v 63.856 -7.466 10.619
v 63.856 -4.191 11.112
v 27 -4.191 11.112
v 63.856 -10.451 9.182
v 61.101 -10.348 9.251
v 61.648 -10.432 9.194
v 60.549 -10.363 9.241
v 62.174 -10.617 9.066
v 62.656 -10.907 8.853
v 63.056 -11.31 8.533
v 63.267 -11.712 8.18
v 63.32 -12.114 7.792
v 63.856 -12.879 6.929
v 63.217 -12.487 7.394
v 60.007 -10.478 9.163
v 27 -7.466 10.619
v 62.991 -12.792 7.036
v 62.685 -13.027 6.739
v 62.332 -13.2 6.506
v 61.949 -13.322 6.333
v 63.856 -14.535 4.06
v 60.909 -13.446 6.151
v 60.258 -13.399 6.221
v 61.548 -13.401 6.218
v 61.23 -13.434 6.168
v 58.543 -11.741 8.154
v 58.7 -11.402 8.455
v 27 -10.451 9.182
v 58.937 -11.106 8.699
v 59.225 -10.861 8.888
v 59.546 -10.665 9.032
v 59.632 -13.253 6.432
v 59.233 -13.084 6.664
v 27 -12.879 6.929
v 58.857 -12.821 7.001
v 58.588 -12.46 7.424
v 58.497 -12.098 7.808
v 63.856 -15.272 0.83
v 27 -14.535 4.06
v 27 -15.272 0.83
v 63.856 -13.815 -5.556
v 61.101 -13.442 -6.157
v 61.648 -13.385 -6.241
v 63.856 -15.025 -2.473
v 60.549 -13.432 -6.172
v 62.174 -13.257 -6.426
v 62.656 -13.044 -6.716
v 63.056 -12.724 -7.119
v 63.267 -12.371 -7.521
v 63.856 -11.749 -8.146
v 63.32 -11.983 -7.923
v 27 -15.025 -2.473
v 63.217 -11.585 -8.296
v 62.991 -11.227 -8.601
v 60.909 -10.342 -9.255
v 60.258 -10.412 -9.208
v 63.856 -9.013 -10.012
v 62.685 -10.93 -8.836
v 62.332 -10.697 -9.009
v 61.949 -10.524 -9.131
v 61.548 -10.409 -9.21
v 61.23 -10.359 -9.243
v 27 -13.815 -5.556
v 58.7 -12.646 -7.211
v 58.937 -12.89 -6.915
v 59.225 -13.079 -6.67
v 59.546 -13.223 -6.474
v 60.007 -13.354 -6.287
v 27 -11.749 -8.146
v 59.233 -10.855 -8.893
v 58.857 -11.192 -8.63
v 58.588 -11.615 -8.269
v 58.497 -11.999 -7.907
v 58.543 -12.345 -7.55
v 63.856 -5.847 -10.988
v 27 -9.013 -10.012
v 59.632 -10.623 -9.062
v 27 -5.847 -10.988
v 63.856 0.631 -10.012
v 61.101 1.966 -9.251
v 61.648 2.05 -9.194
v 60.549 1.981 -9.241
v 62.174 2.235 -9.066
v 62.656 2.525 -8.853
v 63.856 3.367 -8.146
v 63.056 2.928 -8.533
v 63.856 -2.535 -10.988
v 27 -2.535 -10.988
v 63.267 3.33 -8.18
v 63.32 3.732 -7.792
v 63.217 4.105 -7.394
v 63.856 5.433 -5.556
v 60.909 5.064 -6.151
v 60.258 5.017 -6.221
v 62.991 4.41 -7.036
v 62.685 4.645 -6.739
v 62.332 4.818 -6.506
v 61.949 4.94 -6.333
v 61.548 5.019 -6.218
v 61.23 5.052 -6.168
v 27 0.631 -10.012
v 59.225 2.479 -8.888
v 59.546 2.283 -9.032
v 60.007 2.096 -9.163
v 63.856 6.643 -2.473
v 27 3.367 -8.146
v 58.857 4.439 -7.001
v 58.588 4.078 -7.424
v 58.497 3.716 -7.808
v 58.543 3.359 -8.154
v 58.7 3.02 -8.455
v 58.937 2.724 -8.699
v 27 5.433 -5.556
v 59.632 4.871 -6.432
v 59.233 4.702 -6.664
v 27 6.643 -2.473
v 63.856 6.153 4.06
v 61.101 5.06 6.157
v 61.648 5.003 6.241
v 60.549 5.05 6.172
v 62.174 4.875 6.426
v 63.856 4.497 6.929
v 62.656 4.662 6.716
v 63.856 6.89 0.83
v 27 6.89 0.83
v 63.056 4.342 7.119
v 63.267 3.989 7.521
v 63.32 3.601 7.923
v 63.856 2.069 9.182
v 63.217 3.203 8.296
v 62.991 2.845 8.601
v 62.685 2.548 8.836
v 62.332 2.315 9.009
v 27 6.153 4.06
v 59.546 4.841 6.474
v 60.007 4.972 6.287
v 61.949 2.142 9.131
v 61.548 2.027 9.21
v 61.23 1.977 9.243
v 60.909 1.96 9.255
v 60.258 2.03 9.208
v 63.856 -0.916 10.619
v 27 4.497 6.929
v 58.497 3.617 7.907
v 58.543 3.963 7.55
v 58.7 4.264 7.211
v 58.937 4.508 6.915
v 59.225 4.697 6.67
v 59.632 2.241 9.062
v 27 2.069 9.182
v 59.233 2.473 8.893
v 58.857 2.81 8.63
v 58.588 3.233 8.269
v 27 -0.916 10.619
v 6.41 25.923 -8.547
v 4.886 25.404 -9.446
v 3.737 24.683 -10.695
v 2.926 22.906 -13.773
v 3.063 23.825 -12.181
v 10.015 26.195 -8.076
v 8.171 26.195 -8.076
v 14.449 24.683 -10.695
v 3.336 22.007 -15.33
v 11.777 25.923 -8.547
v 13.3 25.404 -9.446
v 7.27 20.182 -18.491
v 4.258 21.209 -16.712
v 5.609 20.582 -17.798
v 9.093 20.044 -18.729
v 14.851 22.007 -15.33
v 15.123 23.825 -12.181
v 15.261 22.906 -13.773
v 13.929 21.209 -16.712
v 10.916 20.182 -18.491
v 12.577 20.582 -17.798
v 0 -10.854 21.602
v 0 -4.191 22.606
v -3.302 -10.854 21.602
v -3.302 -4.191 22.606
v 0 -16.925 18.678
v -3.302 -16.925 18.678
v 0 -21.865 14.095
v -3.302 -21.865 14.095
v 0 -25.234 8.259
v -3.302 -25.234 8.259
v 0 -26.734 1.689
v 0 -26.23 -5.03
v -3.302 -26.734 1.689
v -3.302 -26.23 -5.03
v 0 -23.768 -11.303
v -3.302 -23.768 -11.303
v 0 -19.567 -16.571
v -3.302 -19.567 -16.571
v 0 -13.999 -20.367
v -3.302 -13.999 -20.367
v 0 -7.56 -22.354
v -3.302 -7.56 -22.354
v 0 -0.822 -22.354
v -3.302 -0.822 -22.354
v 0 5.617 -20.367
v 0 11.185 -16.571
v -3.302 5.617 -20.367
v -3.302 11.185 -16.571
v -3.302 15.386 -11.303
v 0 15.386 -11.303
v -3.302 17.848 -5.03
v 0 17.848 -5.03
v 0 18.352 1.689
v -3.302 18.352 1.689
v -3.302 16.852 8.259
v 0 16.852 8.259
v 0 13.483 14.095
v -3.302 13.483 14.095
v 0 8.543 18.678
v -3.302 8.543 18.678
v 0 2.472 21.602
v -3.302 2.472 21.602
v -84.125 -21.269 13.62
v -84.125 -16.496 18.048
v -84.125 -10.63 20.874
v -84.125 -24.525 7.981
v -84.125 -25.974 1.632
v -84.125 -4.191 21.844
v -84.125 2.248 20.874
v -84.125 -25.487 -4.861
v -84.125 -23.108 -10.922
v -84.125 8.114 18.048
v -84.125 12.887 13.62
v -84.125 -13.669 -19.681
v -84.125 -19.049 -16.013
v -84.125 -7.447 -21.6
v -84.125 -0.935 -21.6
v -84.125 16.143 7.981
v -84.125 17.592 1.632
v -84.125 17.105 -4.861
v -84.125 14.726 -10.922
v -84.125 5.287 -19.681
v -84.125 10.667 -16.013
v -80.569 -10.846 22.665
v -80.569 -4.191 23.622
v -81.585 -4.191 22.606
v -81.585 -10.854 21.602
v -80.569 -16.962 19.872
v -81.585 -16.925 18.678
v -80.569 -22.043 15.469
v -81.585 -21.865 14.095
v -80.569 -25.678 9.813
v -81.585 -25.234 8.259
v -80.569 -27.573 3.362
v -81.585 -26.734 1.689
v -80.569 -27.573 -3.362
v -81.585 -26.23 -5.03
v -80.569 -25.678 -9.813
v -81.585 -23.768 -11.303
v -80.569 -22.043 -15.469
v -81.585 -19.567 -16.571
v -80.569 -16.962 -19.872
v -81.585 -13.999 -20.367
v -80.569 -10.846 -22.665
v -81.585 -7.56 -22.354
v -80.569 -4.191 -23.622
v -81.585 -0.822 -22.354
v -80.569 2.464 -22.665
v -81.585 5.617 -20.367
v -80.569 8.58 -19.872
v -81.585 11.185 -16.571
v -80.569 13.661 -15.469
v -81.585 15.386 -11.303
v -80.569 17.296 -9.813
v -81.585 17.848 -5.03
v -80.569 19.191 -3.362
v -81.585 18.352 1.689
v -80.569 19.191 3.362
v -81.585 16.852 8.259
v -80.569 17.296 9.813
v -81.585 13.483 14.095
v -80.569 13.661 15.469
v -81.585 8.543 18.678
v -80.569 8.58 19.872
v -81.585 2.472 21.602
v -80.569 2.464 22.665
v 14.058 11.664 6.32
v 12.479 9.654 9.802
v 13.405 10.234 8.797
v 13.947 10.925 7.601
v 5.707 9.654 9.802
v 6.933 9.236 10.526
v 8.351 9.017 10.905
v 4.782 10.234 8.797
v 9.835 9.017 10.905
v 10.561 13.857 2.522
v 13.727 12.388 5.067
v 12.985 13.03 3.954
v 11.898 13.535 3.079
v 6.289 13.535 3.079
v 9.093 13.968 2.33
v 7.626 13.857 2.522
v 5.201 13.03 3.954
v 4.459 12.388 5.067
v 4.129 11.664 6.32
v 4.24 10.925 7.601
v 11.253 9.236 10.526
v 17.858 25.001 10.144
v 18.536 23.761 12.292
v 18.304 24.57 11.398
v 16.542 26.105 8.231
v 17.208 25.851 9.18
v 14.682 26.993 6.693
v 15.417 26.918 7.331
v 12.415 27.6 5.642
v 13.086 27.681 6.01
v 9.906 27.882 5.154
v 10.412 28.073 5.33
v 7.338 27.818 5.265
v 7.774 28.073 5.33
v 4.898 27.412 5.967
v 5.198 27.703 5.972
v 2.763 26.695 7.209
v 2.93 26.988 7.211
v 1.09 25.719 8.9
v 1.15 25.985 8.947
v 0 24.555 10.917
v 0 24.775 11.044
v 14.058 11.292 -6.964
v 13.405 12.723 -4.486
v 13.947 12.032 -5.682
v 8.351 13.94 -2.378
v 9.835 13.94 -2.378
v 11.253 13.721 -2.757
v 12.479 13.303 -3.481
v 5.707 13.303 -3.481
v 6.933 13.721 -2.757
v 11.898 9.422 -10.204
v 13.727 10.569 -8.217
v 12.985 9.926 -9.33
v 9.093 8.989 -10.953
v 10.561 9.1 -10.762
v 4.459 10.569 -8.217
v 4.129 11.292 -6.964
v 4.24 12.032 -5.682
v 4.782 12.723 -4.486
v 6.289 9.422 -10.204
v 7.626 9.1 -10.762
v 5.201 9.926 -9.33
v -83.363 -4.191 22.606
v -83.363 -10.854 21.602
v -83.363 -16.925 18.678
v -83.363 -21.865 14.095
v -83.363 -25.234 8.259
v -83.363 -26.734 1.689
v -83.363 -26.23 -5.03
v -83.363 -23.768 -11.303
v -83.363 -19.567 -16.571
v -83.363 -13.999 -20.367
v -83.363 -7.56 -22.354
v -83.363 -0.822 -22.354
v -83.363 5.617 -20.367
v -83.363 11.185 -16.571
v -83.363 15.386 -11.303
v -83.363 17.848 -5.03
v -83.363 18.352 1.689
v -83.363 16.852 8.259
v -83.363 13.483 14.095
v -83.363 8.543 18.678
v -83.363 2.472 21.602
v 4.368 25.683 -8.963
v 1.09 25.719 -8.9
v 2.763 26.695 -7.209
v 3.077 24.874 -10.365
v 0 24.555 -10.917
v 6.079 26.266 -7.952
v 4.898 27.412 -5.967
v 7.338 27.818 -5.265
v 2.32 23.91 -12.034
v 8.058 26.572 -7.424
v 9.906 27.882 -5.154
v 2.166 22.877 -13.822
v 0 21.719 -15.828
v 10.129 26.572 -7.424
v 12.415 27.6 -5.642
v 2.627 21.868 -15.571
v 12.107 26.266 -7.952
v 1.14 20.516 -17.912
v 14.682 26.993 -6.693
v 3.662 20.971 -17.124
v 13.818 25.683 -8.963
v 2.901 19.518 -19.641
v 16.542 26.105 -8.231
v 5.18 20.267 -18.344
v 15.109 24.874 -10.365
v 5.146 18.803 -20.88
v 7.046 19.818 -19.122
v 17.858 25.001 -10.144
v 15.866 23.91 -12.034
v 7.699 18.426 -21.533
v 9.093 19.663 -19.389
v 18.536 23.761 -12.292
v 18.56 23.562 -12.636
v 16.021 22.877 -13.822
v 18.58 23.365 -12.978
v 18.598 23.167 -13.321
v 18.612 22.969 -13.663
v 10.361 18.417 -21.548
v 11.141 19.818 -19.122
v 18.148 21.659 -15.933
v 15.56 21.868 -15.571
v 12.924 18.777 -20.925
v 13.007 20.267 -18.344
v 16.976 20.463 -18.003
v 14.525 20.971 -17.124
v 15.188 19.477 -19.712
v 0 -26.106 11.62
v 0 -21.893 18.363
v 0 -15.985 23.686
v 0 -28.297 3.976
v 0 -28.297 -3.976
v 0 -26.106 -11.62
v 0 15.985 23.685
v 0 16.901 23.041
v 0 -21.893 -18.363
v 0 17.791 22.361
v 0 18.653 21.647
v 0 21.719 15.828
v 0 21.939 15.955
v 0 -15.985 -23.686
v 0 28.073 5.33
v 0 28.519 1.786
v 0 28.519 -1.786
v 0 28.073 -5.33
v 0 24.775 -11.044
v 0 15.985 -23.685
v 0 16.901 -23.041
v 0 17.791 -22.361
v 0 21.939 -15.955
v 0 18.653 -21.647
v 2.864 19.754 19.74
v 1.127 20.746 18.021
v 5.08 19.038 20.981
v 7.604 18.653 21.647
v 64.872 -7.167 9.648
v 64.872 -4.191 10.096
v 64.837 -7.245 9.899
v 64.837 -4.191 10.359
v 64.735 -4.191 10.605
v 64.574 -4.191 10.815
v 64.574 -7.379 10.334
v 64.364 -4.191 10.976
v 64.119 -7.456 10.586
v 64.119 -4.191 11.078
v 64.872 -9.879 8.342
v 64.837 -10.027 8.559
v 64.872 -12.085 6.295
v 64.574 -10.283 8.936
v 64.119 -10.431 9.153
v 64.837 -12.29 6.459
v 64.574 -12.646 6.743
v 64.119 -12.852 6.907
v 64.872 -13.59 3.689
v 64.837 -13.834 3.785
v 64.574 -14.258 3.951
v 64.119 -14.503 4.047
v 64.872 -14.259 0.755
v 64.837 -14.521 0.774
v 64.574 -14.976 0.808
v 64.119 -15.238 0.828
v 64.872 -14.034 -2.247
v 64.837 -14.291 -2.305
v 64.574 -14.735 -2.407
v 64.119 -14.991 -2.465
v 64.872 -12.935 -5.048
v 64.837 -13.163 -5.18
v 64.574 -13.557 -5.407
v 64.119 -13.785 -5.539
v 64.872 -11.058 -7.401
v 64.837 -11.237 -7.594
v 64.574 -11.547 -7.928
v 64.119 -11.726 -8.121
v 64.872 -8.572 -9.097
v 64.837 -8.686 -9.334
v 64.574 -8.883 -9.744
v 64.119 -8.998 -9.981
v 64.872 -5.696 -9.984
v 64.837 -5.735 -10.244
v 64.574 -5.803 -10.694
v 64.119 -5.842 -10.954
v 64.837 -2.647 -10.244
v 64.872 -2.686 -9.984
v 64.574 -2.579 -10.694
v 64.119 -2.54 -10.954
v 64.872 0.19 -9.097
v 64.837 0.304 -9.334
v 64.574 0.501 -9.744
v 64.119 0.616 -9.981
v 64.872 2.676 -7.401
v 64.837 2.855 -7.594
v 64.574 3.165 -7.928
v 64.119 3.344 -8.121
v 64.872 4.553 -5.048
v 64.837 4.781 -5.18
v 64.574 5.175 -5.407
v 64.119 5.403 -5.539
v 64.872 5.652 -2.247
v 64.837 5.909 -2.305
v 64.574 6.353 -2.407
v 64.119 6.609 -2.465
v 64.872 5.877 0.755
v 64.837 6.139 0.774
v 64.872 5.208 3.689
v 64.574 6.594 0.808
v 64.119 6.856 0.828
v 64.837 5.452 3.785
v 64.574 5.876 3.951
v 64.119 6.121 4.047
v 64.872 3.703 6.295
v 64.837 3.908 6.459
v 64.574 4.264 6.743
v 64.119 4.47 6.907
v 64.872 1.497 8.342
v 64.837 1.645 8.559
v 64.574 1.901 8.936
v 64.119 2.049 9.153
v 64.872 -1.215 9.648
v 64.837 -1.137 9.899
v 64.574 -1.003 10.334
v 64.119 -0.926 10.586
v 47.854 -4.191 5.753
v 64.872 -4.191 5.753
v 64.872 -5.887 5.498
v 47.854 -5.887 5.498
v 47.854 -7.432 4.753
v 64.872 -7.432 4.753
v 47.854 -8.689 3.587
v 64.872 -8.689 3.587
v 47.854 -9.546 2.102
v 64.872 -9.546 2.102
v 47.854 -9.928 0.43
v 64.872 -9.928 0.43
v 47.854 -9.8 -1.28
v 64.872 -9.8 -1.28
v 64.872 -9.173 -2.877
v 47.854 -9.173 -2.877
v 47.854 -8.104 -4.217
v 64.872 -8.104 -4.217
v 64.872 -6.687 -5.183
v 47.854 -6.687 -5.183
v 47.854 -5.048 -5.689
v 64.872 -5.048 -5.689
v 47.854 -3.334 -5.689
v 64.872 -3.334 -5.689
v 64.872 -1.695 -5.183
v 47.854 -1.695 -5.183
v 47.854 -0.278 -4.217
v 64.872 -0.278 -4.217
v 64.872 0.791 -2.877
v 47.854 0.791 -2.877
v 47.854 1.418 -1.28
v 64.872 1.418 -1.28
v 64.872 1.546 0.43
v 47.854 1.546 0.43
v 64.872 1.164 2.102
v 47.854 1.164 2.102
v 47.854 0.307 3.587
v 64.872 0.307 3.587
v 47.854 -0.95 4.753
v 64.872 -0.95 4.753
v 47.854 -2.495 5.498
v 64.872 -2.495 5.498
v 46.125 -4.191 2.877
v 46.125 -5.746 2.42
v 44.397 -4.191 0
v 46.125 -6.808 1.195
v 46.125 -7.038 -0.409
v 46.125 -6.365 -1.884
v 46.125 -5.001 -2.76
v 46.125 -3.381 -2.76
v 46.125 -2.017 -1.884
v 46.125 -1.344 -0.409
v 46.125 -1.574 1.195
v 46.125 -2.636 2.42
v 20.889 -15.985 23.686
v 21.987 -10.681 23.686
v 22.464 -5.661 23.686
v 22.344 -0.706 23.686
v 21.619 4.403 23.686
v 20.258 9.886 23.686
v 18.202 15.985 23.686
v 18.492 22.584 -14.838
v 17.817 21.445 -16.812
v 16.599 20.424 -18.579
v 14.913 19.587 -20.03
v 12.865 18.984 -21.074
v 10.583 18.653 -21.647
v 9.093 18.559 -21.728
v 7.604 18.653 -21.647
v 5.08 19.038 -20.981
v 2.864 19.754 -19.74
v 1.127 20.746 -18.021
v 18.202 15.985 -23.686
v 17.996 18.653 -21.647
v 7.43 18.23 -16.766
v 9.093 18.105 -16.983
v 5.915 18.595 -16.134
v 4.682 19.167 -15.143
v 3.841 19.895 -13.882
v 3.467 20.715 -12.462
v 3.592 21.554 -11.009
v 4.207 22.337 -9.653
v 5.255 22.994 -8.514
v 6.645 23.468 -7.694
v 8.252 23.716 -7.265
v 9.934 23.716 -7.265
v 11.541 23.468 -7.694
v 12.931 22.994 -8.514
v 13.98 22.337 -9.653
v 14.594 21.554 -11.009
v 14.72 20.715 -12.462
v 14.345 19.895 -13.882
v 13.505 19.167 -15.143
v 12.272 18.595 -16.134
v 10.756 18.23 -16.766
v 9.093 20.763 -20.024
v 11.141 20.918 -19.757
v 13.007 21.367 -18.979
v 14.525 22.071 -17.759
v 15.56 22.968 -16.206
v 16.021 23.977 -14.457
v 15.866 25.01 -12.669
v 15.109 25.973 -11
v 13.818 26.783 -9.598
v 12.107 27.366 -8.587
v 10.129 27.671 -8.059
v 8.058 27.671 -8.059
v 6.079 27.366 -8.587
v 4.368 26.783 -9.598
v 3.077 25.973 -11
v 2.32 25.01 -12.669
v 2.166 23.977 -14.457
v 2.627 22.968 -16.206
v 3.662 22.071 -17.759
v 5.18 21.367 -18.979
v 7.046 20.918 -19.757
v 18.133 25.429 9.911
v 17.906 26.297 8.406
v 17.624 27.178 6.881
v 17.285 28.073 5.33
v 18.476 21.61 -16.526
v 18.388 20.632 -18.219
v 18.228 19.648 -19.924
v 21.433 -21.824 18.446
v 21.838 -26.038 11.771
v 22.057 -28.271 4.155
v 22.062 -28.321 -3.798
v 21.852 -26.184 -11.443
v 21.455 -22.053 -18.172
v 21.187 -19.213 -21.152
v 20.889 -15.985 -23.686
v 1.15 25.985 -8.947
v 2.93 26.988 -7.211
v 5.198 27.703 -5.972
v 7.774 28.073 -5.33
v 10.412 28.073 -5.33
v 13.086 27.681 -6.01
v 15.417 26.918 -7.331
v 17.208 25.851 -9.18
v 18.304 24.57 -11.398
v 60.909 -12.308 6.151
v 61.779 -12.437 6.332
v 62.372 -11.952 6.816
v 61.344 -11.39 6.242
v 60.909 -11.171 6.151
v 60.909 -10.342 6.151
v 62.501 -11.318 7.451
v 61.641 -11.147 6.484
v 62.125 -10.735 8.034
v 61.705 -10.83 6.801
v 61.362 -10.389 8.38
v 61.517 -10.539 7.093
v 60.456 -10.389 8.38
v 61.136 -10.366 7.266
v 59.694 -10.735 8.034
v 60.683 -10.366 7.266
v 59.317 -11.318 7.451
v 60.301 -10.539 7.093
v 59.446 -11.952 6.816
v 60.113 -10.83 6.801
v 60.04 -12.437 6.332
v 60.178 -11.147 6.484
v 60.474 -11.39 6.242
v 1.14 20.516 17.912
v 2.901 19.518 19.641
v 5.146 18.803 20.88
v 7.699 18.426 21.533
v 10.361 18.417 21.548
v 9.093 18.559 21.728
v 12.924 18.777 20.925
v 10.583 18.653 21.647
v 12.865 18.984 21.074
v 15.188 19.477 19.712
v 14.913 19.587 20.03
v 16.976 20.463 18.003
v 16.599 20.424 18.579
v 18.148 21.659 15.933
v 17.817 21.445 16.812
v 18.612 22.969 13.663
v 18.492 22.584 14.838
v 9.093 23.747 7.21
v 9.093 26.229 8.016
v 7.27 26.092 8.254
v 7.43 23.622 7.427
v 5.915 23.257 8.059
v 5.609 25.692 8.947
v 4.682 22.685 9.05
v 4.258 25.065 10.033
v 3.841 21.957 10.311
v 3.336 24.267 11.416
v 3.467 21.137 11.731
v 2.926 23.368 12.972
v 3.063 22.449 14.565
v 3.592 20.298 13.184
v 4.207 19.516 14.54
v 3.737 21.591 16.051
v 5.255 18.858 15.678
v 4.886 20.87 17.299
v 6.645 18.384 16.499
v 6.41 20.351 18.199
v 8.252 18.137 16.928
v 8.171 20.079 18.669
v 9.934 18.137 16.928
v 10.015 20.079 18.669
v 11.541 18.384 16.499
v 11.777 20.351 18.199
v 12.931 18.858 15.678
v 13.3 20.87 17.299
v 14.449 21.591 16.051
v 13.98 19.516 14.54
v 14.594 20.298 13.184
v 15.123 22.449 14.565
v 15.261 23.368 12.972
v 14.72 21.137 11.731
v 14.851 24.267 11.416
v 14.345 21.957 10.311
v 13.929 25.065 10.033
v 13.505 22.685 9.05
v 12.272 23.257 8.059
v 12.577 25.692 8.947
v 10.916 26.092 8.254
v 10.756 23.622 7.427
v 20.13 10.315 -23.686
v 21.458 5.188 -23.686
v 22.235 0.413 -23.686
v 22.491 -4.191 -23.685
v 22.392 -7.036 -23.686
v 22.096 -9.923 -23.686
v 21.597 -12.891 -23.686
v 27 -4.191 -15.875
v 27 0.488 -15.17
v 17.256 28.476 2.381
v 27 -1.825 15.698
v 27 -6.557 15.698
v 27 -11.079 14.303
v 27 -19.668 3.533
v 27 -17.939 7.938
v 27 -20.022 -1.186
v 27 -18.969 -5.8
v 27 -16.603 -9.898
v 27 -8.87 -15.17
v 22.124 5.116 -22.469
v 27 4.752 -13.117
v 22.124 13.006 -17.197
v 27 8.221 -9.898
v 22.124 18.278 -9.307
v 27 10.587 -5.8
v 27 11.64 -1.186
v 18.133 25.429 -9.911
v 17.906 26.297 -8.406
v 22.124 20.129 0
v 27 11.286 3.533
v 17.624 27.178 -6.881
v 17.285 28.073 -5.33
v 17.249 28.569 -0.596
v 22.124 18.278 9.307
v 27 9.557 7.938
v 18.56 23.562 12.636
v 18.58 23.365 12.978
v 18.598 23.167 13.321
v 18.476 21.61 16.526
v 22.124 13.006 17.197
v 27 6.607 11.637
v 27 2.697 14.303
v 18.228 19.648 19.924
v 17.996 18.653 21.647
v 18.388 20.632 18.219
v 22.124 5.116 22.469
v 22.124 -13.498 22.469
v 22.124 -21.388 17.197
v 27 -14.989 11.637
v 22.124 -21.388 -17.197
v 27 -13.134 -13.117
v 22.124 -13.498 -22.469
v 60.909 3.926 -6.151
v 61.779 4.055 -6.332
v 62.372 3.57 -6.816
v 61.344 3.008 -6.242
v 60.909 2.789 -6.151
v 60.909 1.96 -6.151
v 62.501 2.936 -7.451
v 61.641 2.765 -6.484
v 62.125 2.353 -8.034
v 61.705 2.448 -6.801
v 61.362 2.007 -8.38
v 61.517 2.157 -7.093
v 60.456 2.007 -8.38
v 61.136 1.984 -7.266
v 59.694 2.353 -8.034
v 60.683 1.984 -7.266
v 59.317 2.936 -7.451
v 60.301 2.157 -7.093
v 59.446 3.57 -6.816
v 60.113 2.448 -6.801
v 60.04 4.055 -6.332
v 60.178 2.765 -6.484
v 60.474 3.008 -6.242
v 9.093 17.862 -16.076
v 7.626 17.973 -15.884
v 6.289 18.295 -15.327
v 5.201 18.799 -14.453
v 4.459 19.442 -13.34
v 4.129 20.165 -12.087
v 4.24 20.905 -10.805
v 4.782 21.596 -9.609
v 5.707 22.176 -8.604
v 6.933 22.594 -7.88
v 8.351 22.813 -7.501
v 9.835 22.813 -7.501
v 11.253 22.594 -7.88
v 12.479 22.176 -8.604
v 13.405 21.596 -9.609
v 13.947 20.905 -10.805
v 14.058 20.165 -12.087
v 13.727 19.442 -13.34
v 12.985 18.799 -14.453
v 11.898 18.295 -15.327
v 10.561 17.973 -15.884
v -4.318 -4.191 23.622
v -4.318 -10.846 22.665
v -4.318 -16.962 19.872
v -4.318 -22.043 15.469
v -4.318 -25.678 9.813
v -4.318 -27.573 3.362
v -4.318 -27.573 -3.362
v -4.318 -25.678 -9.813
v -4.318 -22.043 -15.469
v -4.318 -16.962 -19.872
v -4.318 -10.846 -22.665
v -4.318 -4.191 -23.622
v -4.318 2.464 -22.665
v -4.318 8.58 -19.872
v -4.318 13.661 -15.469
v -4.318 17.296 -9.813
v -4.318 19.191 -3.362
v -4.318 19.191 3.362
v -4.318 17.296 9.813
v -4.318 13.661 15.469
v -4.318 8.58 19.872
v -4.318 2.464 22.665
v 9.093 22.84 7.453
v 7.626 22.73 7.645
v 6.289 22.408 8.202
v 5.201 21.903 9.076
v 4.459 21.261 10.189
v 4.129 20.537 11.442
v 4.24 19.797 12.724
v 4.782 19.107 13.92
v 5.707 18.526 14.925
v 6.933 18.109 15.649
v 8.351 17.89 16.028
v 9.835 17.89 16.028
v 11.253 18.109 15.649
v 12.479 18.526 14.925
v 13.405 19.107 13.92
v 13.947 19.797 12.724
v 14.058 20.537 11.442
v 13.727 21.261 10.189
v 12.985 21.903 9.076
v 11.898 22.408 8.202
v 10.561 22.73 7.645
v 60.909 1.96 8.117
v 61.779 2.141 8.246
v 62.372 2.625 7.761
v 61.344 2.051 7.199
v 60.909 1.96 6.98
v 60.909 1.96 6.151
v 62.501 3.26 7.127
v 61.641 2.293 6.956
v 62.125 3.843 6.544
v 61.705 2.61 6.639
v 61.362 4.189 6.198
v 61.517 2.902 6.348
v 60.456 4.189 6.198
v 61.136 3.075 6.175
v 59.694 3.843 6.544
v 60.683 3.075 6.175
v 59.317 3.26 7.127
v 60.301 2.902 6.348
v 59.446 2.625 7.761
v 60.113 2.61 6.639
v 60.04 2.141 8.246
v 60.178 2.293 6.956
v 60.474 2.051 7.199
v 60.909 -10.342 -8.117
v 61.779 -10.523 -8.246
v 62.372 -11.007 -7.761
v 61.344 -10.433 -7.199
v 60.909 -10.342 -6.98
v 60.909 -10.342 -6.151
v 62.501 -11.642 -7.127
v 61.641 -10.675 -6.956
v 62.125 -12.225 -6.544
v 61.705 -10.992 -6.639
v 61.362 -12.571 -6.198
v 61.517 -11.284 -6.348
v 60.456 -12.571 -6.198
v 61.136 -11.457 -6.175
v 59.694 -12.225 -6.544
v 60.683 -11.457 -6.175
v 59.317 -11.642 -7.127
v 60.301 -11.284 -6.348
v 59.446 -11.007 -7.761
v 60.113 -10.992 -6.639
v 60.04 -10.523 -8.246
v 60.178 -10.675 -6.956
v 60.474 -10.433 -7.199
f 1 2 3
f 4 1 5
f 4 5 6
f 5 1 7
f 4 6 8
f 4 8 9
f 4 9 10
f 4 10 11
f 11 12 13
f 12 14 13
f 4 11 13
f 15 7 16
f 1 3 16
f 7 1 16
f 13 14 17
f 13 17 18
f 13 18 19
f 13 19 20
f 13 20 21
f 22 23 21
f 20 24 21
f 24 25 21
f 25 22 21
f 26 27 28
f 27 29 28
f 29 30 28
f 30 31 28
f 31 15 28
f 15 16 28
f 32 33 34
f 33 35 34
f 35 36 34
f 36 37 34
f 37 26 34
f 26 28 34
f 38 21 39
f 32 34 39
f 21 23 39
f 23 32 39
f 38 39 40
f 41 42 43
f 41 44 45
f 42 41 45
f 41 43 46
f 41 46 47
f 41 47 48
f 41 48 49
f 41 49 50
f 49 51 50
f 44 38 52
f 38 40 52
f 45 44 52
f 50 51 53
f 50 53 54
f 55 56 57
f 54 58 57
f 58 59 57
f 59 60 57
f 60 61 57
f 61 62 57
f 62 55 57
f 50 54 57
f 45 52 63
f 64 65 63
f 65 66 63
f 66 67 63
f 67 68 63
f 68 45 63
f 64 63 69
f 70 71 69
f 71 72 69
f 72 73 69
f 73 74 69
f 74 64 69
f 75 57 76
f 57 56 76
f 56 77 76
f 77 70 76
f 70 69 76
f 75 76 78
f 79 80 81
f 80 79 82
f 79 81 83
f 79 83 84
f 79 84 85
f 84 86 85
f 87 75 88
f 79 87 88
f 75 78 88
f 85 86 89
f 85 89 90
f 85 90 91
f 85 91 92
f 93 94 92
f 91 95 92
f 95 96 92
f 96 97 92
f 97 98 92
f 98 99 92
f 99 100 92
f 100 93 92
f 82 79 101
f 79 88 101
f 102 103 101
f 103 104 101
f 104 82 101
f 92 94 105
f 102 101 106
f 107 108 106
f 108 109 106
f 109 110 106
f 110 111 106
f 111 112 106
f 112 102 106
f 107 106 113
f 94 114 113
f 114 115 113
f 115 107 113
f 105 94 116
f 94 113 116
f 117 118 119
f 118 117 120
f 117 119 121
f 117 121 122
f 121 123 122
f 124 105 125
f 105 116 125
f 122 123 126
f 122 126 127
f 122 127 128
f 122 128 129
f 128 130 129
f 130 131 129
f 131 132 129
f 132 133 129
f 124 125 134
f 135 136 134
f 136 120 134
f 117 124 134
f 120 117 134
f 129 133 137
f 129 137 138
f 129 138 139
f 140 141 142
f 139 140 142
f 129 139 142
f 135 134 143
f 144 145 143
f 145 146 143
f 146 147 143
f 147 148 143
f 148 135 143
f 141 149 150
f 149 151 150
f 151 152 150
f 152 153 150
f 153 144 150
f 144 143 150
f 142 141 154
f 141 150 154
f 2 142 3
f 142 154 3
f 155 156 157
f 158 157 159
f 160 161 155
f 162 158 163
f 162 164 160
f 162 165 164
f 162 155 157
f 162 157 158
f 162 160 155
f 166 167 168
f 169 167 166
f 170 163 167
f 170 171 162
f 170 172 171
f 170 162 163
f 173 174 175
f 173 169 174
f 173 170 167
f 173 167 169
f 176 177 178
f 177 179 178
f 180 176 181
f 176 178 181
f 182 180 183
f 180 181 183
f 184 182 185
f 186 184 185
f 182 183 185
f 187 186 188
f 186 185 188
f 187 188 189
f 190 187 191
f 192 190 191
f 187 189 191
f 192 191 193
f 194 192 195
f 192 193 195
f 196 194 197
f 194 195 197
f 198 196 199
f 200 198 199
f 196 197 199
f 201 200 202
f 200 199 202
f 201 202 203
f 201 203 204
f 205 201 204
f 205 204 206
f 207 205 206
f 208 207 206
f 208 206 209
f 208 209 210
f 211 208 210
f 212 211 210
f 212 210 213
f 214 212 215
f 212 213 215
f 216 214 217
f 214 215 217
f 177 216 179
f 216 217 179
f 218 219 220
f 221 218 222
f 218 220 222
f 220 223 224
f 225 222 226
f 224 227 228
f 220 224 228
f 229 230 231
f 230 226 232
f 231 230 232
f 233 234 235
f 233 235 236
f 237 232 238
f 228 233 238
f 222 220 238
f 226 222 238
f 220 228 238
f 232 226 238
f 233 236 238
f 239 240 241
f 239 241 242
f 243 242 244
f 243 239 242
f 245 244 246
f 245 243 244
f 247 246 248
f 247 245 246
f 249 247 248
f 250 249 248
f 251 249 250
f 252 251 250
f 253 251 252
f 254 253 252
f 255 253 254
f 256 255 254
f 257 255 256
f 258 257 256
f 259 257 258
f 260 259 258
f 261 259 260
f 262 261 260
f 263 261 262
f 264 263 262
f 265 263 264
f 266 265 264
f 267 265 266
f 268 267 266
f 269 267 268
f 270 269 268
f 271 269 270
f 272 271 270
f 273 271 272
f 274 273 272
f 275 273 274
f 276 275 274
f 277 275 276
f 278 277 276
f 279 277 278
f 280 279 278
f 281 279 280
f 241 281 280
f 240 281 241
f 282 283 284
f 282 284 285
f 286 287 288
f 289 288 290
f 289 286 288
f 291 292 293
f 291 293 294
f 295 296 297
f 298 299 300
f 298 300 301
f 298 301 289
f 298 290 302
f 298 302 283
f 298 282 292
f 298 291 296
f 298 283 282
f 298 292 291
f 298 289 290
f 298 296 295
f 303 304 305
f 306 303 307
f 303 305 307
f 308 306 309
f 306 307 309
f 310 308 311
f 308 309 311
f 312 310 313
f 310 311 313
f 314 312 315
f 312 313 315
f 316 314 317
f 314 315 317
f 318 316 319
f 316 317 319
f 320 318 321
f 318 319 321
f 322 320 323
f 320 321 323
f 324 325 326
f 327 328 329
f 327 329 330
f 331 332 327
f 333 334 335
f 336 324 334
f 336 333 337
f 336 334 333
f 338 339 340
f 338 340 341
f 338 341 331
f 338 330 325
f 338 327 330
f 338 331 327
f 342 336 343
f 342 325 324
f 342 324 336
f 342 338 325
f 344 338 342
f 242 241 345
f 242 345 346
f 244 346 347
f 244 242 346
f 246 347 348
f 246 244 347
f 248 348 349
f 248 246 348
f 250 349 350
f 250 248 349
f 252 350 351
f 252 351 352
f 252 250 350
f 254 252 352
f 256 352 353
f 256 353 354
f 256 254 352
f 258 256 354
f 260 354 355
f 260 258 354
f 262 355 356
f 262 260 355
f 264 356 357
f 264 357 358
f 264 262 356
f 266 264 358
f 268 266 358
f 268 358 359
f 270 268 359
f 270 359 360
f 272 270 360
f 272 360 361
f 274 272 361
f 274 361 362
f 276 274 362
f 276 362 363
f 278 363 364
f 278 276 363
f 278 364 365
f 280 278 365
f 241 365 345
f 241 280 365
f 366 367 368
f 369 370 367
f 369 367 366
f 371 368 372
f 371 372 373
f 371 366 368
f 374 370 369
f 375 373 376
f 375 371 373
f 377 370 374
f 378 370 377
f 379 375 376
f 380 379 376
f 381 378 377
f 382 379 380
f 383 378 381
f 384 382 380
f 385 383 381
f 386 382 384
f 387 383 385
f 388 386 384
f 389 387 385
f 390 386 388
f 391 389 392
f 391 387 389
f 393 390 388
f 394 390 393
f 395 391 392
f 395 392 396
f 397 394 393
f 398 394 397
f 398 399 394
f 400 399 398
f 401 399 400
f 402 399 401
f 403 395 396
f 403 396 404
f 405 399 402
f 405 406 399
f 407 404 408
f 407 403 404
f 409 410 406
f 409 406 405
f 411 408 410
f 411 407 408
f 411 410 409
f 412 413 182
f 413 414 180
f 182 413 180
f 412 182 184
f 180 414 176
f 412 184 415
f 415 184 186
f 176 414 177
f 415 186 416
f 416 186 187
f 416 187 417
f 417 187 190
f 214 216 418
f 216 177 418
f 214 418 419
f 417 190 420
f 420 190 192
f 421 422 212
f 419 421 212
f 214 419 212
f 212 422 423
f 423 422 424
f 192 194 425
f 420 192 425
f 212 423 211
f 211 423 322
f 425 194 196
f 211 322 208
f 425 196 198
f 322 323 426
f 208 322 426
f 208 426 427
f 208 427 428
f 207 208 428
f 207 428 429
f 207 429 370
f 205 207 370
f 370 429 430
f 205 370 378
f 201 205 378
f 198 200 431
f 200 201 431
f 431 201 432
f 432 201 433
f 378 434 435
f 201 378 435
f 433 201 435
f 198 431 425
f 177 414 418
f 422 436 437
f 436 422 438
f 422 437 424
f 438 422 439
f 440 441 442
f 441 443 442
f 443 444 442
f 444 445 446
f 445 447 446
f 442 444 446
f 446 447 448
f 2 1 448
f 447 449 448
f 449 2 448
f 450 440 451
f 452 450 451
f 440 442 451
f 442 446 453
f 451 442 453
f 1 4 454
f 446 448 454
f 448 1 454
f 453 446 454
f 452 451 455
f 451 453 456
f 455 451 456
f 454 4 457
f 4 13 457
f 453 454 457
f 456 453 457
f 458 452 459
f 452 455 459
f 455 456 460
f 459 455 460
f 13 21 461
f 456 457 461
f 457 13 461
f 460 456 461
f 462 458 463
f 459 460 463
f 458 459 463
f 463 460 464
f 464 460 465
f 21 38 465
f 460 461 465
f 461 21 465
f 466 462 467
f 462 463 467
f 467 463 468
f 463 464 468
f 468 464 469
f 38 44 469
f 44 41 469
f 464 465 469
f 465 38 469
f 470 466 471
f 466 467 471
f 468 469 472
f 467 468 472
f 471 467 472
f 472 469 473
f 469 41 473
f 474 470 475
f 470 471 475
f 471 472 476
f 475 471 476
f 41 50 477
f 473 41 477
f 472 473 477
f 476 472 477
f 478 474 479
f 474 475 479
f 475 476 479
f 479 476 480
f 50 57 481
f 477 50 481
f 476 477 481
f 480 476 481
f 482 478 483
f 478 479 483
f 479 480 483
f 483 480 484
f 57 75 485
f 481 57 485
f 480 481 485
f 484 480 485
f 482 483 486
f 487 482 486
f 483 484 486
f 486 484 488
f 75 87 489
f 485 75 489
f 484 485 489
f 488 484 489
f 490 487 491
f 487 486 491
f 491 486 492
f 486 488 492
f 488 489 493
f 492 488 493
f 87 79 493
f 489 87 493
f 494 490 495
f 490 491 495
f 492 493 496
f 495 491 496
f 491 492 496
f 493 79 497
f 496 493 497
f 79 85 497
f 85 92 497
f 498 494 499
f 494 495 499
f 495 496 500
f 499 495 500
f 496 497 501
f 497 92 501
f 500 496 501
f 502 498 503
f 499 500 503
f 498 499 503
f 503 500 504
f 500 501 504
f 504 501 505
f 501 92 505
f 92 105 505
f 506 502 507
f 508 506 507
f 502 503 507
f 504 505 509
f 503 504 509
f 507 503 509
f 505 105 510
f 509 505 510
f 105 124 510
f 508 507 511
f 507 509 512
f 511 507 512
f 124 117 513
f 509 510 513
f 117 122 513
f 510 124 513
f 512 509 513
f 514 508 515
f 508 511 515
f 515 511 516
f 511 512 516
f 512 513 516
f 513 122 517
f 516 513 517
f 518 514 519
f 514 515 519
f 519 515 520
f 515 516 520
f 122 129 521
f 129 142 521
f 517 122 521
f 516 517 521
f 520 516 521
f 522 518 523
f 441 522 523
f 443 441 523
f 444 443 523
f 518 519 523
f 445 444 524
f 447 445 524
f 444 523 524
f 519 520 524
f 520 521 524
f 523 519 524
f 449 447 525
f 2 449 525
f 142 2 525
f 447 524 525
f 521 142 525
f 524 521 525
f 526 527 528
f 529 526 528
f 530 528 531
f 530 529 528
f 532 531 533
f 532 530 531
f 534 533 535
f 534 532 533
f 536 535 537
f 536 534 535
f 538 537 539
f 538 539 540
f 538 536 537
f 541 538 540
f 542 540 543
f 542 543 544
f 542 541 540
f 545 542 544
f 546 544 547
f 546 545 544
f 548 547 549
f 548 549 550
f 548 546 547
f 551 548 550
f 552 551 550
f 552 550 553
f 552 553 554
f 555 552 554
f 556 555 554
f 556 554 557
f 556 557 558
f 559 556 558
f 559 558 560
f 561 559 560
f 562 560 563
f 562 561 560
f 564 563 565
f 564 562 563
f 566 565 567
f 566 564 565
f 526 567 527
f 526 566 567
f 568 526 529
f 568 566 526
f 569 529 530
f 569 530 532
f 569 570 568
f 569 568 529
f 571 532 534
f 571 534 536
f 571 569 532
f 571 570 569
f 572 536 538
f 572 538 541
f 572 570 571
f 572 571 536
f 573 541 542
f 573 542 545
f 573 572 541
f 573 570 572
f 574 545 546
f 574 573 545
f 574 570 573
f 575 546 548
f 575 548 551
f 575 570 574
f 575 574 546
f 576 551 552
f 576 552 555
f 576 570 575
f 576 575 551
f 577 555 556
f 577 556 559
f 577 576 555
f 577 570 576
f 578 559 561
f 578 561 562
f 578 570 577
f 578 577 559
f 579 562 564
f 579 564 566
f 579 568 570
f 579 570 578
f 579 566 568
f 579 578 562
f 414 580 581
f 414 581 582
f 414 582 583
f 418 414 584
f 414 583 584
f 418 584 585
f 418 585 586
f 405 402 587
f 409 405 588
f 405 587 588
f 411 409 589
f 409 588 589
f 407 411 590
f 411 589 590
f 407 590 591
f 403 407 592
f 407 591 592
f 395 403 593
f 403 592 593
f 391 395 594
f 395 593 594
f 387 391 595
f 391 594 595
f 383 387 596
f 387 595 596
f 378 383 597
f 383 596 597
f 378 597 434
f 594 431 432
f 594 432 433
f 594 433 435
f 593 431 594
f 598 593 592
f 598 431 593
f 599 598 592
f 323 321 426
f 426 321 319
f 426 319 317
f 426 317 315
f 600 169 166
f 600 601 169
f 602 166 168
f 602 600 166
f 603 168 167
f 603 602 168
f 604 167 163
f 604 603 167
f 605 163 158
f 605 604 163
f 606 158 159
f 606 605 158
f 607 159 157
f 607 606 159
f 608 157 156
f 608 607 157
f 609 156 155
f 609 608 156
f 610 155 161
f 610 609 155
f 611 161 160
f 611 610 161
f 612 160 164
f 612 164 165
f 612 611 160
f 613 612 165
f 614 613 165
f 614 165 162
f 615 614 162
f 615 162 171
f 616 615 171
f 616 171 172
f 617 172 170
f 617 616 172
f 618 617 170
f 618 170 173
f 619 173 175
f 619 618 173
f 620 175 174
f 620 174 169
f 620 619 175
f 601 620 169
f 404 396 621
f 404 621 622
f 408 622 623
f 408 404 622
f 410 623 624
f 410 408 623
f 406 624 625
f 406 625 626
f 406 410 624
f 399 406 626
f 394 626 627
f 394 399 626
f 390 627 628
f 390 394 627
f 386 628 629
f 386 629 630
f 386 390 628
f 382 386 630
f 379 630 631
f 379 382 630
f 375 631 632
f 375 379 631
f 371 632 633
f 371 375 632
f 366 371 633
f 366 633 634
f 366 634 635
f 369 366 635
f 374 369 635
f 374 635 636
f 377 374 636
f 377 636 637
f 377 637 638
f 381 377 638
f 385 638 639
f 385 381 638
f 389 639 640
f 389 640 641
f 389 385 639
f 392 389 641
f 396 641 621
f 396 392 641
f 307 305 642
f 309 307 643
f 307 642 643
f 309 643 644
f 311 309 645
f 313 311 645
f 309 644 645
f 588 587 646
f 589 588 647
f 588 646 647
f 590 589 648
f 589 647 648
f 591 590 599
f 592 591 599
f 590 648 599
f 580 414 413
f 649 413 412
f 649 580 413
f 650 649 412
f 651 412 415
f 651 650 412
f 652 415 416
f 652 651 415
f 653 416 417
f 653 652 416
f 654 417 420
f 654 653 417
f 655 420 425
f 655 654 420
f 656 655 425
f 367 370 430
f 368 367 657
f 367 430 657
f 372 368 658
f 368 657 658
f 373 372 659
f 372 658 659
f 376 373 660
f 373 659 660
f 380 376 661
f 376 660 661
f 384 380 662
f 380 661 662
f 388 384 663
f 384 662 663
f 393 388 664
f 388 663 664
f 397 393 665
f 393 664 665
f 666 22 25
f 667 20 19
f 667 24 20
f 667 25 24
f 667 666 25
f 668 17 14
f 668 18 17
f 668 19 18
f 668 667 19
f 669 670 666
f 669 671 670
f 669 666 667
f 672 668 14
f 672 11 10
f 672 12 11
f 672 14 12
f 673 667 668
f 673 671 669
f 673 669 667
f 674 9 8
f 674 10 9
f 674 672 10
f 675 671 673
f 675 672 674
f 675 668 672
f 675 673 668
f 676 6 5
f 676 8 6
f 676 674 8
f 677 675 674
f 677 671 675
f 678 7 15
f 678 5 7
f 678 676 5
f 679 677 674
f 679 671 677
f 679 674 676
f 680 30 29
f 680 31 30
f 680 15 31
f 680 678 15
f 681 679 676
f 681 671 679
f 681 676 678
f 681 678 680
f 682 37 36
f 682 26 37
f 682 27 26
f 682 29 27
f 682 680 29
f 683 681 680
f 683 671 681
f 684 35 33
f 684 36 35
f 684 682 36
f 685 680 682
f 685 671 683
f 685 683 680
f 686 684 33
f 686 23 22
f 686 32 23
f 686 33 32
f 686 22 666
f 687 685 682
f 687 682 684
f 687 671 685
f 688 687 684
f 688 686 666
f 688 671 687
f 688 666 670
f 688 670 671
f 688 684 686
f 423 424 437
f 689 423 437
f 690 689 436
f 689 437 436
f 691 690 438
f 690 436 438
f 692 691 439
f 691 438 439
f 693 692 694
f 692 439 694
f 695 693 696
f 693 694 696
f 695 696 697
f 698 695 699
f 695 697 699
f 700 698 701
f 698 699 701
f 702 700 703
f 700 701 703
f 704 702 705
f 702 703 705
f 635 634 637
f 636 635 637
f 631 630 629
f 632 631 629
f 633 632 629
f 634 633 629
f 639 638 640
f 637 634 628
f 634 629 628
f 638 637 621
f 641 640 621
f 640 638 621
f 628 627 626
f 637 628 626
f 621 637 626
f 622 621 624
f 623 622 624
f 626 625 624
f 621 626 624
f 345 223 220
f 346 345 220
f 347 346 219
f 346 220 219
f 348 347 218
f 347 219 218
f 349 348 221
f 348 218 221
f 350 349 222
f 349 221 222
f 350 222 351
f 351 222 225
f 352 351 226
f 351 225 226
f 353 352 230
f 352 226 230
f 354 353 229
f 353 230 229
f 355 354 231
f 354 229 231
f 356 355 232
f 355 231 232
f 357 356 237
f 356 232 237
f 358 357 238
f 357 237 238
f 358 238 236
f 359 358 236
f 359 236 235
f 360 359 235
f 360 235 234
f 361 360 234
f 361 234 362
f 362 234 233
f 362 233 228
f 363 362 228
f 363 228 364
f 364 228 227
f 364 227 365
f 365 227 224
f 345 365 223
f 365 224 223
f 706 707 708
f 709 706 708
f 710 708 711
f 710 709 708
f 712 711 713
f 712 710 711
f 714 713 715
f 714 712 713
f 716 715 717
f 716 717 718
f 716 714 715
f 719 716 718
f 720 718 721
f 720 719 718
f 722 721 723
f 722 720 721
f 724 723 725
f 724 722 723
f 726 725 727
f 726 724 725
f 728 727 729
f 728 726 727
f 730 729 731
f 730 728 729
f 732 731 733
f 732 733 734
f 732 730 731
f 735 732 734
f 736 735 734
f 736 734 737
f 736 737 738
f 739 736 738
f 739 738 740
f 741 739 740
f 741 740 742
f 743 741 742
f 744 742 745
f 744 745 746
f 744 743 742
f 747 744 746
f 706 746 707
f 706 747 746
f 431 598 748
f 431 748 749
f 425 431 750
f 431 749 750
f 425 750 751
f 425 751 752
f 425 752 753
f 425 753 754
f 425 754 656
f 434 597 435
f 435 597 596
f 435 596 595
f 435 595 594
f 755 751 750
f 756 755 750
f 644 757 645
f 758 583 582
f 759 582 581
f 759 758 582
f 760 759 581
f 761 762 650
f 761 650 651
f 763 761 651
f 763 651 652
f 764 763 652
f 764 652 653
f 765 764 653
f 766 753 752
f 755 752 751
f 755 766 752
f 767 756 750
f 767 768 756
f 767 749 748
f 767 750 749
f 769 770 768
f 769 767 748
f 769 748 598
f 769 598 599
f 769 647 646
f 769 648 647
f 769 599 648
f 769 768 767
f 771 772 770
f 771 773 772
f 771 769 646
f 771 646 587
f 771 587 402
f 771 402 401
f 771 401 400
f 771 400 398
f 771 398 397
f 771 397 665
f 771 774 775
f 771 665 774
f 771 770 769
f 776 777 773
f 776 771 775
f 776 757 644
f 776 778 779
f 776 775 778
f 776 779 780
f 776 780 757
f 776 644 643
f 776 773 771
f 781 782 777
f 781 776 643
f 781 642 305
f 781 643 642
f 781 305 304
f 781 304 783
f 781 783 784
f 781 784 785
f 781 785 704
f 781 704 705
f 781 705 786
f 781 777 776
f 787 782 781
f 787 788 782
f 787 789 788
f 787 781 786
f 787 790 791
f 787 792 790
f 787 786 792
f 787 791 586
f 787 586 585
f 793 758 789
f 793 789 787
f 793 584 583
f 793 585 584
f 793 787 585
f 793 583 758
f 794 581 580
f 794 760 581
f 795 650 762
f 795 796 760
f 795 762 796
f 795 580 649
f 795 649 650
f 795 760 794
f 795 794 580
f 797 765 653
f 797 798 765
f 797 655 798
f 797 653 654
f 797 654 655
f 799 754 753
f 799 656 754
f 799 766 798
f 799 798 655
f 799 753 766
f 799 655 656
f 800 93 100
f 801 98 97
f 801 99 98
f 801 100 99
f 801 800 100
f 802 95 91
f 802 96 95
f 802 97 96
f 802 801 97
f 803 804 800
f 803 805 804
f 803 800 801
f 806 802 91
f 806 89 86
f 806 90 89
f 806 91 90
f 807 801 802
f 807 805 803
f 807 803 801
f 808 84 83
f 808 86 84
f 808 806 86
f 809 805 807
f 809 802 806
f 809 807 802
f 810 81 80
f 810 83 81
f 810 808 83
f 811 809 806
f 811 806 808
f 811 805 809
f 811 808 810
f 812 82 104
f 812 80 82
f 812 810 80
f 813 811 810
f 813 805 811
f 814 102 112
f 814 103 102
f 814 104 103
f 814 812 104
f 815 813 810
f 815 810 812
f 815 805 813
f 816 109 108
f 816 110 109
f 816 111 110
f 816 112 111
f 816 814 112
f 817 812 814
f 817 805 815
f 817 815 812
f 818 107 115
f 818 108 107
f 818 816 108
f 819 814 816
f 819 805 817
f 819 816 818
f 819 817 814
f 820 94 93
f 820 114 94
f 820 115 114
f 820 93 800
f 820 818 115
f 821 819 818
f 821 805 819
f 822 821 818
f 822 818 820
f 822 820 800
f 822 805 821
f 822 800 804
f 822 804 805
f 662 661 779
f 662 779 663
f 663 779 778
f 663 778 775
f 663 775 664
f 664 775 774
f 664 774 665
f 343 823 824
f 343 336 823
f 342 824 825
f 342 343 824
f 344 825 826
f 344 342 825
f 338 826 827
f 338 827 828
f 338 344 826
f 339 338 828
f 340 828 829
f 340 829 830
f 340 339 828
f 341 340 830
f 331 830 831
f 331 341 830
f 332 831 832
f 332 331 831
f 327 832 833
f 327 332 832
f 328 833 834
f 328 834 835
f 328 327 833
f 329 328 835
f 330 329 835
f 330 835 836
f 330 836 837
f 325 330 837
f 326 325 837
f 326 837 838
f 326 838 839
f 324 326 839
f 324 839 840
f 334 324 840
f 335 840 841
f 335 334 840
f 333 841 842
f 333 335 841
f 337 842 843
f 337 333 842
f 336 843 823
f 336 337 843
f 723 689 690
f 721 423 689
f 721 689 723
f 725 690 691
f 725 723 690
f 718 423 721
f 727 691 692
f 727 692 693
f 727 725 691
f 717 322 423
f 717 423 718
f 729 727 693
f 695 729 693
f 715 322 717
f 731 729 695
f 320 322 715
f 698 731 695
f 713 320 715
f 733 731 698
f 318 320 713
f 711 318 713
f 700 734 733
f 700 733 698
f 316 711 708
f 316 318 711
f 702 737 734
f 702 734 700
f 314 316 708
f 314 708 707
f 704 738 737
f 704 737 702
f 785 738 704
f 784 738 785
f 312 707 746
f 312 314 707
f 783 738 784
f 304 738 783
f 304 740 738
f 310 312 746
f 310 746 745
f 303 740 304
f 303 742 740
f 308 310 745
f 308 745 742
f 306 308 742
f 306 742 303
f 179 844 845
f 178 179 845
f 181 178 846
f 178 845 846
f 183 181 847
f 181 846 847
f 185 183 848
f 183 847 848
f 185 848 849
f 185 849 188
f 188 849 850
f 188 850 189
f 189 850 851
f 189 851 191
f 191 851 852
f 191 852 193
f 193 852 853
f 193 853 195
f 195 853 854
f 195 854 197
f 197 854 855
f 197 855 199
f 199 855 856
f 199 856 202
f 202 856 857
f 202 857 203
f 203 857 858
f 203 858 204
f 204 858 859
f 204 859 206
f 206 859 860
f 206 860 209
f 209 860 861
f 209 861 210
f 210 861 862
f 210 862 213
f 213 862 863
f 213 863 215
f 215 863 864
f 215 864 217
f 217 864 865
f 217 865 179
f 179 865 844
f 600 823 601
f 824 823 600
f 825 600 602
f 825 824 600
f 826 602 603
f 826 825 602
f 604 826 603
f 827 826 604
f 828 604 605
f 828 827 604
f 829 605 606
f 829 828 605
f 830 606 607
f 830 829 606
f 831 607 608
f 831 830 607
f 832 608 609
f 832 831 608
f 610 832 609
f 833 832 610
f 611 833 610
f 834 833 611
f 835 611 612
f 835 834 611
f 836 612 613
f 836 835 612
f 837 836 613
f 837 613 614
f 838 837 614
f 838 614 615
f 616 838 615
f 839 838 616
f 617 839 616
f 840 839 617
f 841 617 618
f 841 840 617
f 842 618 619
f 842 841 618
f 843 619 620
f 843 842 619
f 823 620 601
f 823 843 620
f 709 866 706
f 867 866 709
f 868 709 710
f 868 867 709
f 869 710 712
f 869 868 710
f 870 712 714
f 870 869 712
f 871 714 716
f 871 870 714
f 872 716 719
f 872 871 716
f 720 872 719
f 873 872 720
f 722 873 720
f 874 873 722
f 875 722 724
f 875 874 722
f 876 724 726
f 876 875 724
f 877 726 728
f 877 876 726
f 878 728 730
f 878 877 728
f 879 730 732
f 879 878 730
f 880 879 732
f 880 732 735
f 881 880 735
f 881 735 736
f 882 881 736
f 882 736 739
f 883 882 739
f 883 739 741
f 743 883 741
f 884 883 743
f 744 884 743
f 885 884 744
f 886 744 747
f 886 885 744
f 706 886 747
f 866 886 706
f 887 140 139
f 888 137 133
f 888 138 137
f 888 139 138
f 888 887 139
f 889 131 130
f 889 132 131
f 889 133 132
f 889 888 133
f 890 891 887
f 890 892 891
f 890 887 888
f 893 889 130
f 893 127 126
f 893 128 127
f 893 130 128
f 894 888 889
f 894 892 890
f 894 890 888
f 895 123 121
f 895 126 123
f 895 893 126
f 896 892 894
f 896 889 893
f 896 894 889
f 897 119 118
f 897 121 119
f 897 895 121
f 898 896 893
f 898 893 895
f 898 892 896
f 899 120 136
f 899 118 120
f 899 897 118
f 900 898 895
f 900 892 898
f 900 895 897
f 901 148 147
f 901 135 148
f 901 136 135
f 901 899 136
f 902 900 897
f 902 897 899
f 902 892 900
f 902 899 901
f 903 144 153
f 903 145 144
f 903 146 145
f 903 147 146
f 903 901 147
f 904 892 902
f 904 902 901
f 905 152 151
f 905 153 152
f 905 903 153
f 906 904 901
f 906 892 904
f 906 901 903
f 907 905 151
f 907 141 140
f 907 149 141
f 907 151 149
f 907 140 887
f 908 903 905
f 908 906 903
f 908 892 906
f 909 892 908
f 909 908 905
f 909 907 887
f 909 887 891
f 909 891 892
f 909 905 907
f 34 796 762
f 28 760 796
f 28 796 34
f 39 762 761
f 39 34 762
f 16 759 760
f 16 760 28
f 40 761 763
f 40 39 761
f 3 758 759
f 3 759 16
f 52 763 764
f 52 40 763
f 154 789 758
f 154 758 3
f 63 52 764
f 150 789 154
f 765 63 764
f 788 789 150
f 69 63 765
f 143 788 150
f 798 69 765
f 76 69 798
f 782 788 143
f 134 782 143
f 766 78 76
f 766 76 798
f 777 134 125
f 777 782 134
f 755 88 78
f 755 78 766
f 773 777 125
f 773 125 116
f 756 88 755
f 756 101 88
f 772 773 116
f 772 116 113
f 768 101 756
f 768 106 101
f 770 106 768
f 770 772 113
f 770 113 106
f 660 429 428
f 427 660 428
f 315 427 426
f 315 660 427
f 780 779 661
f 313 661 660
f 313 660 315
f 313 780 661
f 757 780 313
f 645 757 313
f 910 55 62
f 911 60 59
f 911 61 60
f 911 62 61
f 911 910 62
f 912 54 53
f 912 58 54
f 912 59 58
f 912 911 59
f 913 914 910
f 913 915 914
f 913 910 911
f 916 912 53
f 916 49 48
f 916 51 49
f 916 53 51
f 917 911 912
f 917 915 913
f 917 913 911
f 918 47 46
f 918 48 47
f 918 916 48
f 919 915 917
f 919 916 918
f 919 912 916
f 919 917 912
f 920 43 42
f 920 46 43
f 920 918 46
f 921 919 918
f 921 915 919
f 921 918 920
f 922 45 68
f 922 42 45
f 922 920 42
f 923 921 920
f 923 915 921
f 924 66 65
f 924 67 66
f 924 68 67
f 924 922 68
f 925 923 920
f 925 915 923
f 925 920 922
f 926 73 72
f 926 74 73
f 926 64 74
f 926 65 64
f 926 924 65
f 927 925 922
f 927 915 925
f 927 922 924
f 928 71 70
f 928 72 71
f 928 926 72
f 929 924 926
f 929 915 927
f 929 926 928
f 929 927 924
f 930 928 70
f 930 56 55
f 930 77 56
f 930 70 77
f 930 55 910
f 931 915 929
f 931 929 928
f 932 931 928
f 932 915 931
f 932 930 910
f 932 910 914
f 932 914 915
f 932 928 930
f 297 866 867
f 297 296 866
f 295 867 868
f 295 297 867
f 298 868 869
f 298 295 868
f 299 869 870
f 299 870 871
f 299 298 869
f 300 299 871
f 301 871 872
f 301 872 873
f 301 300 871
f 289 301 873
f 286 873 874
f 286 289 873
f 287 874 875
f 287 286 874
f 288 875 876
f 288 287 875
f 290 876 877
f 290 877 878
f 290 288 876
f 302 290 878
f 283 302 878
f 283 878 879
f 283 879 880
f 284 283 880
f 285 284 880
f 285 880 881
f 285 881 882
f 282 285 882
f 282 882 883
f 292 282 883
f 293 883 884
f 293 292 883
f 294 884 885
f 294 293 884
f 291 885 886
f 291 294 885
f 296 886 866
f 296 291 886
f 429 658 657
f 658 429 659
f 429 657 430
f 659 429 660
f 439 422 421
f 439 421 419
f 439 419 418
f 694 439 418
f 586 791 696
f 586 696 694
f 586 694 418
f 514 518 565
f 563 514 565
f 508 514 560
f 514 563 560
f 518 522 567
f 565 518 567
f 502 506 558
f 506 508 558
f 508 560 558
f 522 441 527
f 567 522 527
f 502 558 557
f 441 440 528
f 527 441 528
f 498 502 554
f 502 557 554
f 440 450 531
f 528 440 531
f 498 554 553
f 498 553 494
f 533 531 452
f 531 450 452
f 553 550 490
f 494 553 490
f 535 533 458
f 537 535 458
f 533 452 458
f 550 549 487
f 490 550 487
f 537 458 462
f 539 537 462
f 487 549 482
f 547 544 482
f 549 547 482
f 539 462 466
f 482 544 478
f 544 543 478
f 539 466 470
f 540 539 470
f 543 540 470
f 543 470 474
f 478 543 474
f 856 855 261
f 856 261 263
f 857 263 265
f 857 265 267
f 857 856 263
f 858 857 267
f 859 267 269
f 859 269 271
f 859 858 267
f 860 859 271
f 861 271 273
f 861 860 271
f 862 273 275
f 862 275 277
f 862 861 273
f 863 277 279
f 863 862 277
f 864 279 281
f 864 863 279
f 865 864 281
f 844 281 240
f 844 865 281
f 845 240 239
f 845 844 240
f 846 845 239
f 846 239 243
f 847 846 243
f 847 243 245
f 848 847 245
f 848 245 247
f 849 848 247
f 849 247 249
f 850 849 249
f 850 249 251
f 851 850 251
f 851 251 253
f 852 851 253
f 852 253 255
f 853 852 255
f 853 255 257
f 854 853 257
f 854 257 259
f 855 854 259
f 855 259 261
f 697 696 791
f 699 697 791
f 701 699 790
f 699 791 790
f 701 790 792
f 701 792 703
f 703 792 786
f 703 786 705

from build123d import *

# Parameters (mm, degrees)
SKETCH1_R           = 28.575
EXTRUDE1_DEPTH      = 27.0002
EXTRUDE1_DEPTH_BACK = 84.1248
CUT_EXTRUDE1_REACH  = 86.125
SKETCH2_R           = 28.575
SKETCH2_R_2         = 23.622
CUT_EXTRUDE3_START  = -27.0002
CUT_EXTRUDE3_DEPTH  = 27.0002
SKETCH18_R          = 9.525
CUT_EXTRUDE4_DEPTH  = 0.254
SKETCH19_R          = 9.525
CUT_EXTRUDE5_DEPTH  = 0.254
CHAMFER1_SIZE       = 0.762
SKETCH15_R          = 6.9469
EXTRUDE2_DEPTH      = 1.27
CIRPATTERN1_COUNT   = 4


with BuildPart() as part:
    # Sketch1 → Extrude1 (new body, two sides)
    with BuildSketch(Plane(origin=(0, 0, 0), x_dir=(0, 0, -1), z_dir=(1, 0, 0))) as extrude1_sk:
        Circle(SKETCH1_R)
    extrude(amount=EXTRUDE1_DEPTH)
    extrude(extrude1_sk.sketch, amount=-EXTRUDE1_DEPTH_BACK)

    # Sketch2 → Cut-Extrude1 (cut, up to next)
    with BuildSketch(Plane(origin=(0, 0, 0), x_dir=(0, 0, -1), z_dir=(1, 0, 0)), mode=Mode.PRIVATE) as cut_extrude1_sk1:
        Circle(SKETCH2_R)
        with Locations((0, -4.191)):
            Circle(SKETCH2_R_2, mode=Mode.SUBTRACT)
    cut_extrude1_tool1 = extrude(cut_extrude1_sk1.sketch, amount=-CUT_EXTRUDE1_REACH, mode=Mode.PRIVATE) & part.part
    add(cut_extrude1_tool1.solids().sort_by_distance((0, 0, 27.766777))[0], mode=Mode.SUBTRACT)

    # Sketch4 → Cut-Extrude3 (cut)
    with BuildSketch(Plane.ZY.offset(CUT_EXTRUDE3_START)):
        with BuildLine():
            Line((23.6855, -25.666178421), (23.6855, 17.476089577))
            Line((23.6855, 17.476089577), (0, 31.150919378))
            Line((0, 31.150919378), (-23.6855, 17.476089577))
            Line((-23.6855, 17.476089577), (-23.6855, -25.666178421))
            ThreePointArc((-23.6855, -25.666178421), (0, 34.925), (23.6855, -25.666178421))
        make_face()
    extrude(amount=CUT_EXTRUDE3_DEPTH, mode=Mode.SUBTRACT)

    # Sketch6 → Cut-Revolve2 (revolve, cut)
    with BuildSketch(Plane.XY, mode=Mode.PRIVATE) as cut_revolve2_sk:
        Polygon((0.750392661, 57.15), (27.0002, 11.684), (27.0002, 57.15), align=None)
    revolve(cut_revolve2_sk.sketch.rotate(Axis((-0.562097706, -4.191, 0), (1, 0, 0)), 270), axis=Axis((-0.562097706, -4.191, 0), (1, 0, 0)), mode=Mode.SUBTRACT)  # turned: the seam where the file's is

    # S2D0002 → Cut-Revolve3 (revolve, cut)
    with BuildSketch(Plane(origin=(9.0932, 23.136869081, 13.372742289), x_dir=(0, 0.5, -0.866025404), z_dir=(1, 0, 0))):
        Polygon((0, 0), (6.1849, 0), (5.642306865, -2.5527), (4.9784, -3.216606865), (4.9784, -13.462), (0, -13.462), align=None)
    revolve(axis=Axis((9.0932, 10.895513396, 6.305192289), (0, 0.866025404, 0.5)), mode=Mode.SUBTRACT)

    # Sketch8 → Cut-Revolve4 (revolve, cut)
    with BuildSketch(Plane(origin=(9.0932, 23.136869081, -13.372742289), x_dir=(0, -0.5, -0.866025404), z_dir=(1, 0, 0))):
        Polygon((0, 0), (6.1849, 0), (5.642306865, -2.5527), (4.9784, -3.216606865), (4.9784, -13.462), (0, -13.462), align=None)
    revolve(axis=Axis((9.0932, 10.895513396, -6.305192289), (0, 0.866025404, -0.5)), mode=Mode.SUBTRACT)

    # Sketch18 → Cut-Extrude4 (cut)
    with BuildSketch(Plane(origin=(0, 23.363189534, 13.488743766), x_dir=(1, 0, 0), z_dir=(0, 0.866025404, 0.5))):
        with Locations((9.0932, -0.0127)):
            Circle(SKETCH18_R)
    extrude(amount=-CUT_EXTRUDE4_DEPTH, mode=Mode.SUBTRACT)

    # Sketch19 → Cut-Extrude5 (cut)
    with BuildSketch(Plane(origin=(0, 23.363189534, -13.488743766), x_dir=(1, 0, 0), z_dir=(0, 0.866025404, -0.5))):
        with Locations((9.0932, 0.0127)):
            Circle(SKETCH19_R)
    extrude(amount=-CUT_EXTRUDE5_DEPTH, mode=Mode.SUBTRACT)

    # Sketch10 → Cut-Revolve6 (revolve, cut)
    with BuildSketch(Plane.XY, mode=Mode.PRIVATE) as cut_revolve6_sk:
        Polygon((0, 19.431), (0, 18.415), (-3.302, 18.415), (-4.318, 19.431), align=None)
    revolve(cut_revolve6_sk.sketch.rotate(Axis((-4.5339, -4.191, 0), (1, 0, 0)), 90), axis=Axis((-4.5339, -4.191, 0), (1, 0, 0)), mode=Mode.SUBTRACT)  # turned: the seam where the file's is

    # Sketch12 → Cut-Revolve8 (revolve, cut)
    with BuildSketch(Plane.XY, mode=Mode.PRIVATE) as cut_revolve8_sk:
        Polygon((-84.1248, 19.431), (-84.1248, 18.415), (-81.5848, 18.415), (-80.5688, 19.431), align=None)
    revolve(cut_revolve8_sk.sketch.rotate(Axis((-84.3026, -4.191, 0), (1, 0, 0)), 90), axis=Axis((-84.3026, -4.191, 0), (1, 0, 0)), mode=Mode.SUBTRACT)  # turned: the seam where the file's is

    # Chamfer1
    chamfer1_edges = [part.edges().sort_by_distance(p)[0] for p in [
        (-84.1248, -4.191, -22.606),
    ]]
    chamfer(chamfer1_edges, length=CHAMFER1_SIZE)

    # Sketch13 → Revolve1 (revolve)
    with BuildSketch(Plane(origin=(0, 0, 0), x_dir=(0, -1, 0), z_dir=(0, 0, 1)), mode=Mode.PRIVATE) as revolve1_sk:
        with BuildLine():
            Line((4.191, 27.0002), (4.191, 64.8716))
            Line((4.191, 64.8716), (14.2875, 64.8716))
            ThreePointArc((14.2875, 64.8716), (15.00592049, 64.57402049), (15.3035, 63.8556))
            Line((15.3035, 63.8556), (15.3035, 27.0002))
            Line((15.3035, 27.0002), (4.191, 27.0002))
        make_face()
    revolve(revolve1_sk.sketch.rotate(Axis((25.10663, -4.191, 0), (1, 0, 0)), 270), axis=Axis((25.10663, -4.191, 0), (1, 0, 0)))  # turned: the seam where the file's is

    # S2D0001 → Cut-Revolve9 (revolve, cut)
    with BuildSketch(Plane(origin=(64.8716, -9.9441, 0), x_dir=(0, -1, 0), z_dir=(0, 0, 1)), mode=Mode.PRIVATE) as cut_revolve9_sk:
        Polygon((0, 0), (0, -17.018), (-5.7531, -20.474811227), (-5.7531, 0), align=None)
    revolve(cut_revolve9_sk.sketch.rotate(Axis((43.373048211, -4.191, 0), (1, 0, 0)), 270), axis=Axis((43.373048211, -4.191, 0), (1, 0, 0)), mode=Mode.SUBTRACT)  # turned: the seam where the file's is

    # Sketch15 → Extrude2 (add)
    with BuildSketch(Plane(origin=(27.0002, 23.143219081, -13.361743766), x_dir=(0, -0.5, -0.866025404), z_dir=(0, -0.866025404, 0.5))):
        with Locations((0.0127, -17.907)):
            Circle(SKETCH15_R)
    extrude(amount=-EXTRUDE2_DEPTH)

    # Sketch16 → Cut-Revolve10 (revolve, cut)
    with BuildSketch(Plane(origin=(60.9092, 3.666724106, -7.857724106), x_dir=(-1, 0, 0), z_dir=(0, -0.707106781, -0.707106781)), mode=Mode.PRIVATE) as cut_revolve10_sk:
        Polygon((0, 0), (2.413, 0), (0, -2.413), align=None)
    cut_revolve10 = revolve(cut_revolve10_sk.sketch.rotate(Axis((60.9092, 0.494324135, -4.685324135), (0, 0.707106781, -0.707106781)), 90), axis=Axis((60.9092, 0.494324135, -4.685324135), (0, 0.707106781, -0.707106781)), mode=Mode.SUBTRACT)  # turned: the seam where the file's is

    # CirPattern1: Cut-Revolve10 ×4 about axis
    cirpattern1_axis = Axis((25.10663, -4.191, 0), (-1, 0, 0))
    for i in range(1, CIRPATTERN1_COUNT):
        add(cut_revolve10.rotate(cirpattern1_axis, i * 360 / CIRPATTERN1_COUNT), mode=Mode.SUBTRACT)


solid = part.part
